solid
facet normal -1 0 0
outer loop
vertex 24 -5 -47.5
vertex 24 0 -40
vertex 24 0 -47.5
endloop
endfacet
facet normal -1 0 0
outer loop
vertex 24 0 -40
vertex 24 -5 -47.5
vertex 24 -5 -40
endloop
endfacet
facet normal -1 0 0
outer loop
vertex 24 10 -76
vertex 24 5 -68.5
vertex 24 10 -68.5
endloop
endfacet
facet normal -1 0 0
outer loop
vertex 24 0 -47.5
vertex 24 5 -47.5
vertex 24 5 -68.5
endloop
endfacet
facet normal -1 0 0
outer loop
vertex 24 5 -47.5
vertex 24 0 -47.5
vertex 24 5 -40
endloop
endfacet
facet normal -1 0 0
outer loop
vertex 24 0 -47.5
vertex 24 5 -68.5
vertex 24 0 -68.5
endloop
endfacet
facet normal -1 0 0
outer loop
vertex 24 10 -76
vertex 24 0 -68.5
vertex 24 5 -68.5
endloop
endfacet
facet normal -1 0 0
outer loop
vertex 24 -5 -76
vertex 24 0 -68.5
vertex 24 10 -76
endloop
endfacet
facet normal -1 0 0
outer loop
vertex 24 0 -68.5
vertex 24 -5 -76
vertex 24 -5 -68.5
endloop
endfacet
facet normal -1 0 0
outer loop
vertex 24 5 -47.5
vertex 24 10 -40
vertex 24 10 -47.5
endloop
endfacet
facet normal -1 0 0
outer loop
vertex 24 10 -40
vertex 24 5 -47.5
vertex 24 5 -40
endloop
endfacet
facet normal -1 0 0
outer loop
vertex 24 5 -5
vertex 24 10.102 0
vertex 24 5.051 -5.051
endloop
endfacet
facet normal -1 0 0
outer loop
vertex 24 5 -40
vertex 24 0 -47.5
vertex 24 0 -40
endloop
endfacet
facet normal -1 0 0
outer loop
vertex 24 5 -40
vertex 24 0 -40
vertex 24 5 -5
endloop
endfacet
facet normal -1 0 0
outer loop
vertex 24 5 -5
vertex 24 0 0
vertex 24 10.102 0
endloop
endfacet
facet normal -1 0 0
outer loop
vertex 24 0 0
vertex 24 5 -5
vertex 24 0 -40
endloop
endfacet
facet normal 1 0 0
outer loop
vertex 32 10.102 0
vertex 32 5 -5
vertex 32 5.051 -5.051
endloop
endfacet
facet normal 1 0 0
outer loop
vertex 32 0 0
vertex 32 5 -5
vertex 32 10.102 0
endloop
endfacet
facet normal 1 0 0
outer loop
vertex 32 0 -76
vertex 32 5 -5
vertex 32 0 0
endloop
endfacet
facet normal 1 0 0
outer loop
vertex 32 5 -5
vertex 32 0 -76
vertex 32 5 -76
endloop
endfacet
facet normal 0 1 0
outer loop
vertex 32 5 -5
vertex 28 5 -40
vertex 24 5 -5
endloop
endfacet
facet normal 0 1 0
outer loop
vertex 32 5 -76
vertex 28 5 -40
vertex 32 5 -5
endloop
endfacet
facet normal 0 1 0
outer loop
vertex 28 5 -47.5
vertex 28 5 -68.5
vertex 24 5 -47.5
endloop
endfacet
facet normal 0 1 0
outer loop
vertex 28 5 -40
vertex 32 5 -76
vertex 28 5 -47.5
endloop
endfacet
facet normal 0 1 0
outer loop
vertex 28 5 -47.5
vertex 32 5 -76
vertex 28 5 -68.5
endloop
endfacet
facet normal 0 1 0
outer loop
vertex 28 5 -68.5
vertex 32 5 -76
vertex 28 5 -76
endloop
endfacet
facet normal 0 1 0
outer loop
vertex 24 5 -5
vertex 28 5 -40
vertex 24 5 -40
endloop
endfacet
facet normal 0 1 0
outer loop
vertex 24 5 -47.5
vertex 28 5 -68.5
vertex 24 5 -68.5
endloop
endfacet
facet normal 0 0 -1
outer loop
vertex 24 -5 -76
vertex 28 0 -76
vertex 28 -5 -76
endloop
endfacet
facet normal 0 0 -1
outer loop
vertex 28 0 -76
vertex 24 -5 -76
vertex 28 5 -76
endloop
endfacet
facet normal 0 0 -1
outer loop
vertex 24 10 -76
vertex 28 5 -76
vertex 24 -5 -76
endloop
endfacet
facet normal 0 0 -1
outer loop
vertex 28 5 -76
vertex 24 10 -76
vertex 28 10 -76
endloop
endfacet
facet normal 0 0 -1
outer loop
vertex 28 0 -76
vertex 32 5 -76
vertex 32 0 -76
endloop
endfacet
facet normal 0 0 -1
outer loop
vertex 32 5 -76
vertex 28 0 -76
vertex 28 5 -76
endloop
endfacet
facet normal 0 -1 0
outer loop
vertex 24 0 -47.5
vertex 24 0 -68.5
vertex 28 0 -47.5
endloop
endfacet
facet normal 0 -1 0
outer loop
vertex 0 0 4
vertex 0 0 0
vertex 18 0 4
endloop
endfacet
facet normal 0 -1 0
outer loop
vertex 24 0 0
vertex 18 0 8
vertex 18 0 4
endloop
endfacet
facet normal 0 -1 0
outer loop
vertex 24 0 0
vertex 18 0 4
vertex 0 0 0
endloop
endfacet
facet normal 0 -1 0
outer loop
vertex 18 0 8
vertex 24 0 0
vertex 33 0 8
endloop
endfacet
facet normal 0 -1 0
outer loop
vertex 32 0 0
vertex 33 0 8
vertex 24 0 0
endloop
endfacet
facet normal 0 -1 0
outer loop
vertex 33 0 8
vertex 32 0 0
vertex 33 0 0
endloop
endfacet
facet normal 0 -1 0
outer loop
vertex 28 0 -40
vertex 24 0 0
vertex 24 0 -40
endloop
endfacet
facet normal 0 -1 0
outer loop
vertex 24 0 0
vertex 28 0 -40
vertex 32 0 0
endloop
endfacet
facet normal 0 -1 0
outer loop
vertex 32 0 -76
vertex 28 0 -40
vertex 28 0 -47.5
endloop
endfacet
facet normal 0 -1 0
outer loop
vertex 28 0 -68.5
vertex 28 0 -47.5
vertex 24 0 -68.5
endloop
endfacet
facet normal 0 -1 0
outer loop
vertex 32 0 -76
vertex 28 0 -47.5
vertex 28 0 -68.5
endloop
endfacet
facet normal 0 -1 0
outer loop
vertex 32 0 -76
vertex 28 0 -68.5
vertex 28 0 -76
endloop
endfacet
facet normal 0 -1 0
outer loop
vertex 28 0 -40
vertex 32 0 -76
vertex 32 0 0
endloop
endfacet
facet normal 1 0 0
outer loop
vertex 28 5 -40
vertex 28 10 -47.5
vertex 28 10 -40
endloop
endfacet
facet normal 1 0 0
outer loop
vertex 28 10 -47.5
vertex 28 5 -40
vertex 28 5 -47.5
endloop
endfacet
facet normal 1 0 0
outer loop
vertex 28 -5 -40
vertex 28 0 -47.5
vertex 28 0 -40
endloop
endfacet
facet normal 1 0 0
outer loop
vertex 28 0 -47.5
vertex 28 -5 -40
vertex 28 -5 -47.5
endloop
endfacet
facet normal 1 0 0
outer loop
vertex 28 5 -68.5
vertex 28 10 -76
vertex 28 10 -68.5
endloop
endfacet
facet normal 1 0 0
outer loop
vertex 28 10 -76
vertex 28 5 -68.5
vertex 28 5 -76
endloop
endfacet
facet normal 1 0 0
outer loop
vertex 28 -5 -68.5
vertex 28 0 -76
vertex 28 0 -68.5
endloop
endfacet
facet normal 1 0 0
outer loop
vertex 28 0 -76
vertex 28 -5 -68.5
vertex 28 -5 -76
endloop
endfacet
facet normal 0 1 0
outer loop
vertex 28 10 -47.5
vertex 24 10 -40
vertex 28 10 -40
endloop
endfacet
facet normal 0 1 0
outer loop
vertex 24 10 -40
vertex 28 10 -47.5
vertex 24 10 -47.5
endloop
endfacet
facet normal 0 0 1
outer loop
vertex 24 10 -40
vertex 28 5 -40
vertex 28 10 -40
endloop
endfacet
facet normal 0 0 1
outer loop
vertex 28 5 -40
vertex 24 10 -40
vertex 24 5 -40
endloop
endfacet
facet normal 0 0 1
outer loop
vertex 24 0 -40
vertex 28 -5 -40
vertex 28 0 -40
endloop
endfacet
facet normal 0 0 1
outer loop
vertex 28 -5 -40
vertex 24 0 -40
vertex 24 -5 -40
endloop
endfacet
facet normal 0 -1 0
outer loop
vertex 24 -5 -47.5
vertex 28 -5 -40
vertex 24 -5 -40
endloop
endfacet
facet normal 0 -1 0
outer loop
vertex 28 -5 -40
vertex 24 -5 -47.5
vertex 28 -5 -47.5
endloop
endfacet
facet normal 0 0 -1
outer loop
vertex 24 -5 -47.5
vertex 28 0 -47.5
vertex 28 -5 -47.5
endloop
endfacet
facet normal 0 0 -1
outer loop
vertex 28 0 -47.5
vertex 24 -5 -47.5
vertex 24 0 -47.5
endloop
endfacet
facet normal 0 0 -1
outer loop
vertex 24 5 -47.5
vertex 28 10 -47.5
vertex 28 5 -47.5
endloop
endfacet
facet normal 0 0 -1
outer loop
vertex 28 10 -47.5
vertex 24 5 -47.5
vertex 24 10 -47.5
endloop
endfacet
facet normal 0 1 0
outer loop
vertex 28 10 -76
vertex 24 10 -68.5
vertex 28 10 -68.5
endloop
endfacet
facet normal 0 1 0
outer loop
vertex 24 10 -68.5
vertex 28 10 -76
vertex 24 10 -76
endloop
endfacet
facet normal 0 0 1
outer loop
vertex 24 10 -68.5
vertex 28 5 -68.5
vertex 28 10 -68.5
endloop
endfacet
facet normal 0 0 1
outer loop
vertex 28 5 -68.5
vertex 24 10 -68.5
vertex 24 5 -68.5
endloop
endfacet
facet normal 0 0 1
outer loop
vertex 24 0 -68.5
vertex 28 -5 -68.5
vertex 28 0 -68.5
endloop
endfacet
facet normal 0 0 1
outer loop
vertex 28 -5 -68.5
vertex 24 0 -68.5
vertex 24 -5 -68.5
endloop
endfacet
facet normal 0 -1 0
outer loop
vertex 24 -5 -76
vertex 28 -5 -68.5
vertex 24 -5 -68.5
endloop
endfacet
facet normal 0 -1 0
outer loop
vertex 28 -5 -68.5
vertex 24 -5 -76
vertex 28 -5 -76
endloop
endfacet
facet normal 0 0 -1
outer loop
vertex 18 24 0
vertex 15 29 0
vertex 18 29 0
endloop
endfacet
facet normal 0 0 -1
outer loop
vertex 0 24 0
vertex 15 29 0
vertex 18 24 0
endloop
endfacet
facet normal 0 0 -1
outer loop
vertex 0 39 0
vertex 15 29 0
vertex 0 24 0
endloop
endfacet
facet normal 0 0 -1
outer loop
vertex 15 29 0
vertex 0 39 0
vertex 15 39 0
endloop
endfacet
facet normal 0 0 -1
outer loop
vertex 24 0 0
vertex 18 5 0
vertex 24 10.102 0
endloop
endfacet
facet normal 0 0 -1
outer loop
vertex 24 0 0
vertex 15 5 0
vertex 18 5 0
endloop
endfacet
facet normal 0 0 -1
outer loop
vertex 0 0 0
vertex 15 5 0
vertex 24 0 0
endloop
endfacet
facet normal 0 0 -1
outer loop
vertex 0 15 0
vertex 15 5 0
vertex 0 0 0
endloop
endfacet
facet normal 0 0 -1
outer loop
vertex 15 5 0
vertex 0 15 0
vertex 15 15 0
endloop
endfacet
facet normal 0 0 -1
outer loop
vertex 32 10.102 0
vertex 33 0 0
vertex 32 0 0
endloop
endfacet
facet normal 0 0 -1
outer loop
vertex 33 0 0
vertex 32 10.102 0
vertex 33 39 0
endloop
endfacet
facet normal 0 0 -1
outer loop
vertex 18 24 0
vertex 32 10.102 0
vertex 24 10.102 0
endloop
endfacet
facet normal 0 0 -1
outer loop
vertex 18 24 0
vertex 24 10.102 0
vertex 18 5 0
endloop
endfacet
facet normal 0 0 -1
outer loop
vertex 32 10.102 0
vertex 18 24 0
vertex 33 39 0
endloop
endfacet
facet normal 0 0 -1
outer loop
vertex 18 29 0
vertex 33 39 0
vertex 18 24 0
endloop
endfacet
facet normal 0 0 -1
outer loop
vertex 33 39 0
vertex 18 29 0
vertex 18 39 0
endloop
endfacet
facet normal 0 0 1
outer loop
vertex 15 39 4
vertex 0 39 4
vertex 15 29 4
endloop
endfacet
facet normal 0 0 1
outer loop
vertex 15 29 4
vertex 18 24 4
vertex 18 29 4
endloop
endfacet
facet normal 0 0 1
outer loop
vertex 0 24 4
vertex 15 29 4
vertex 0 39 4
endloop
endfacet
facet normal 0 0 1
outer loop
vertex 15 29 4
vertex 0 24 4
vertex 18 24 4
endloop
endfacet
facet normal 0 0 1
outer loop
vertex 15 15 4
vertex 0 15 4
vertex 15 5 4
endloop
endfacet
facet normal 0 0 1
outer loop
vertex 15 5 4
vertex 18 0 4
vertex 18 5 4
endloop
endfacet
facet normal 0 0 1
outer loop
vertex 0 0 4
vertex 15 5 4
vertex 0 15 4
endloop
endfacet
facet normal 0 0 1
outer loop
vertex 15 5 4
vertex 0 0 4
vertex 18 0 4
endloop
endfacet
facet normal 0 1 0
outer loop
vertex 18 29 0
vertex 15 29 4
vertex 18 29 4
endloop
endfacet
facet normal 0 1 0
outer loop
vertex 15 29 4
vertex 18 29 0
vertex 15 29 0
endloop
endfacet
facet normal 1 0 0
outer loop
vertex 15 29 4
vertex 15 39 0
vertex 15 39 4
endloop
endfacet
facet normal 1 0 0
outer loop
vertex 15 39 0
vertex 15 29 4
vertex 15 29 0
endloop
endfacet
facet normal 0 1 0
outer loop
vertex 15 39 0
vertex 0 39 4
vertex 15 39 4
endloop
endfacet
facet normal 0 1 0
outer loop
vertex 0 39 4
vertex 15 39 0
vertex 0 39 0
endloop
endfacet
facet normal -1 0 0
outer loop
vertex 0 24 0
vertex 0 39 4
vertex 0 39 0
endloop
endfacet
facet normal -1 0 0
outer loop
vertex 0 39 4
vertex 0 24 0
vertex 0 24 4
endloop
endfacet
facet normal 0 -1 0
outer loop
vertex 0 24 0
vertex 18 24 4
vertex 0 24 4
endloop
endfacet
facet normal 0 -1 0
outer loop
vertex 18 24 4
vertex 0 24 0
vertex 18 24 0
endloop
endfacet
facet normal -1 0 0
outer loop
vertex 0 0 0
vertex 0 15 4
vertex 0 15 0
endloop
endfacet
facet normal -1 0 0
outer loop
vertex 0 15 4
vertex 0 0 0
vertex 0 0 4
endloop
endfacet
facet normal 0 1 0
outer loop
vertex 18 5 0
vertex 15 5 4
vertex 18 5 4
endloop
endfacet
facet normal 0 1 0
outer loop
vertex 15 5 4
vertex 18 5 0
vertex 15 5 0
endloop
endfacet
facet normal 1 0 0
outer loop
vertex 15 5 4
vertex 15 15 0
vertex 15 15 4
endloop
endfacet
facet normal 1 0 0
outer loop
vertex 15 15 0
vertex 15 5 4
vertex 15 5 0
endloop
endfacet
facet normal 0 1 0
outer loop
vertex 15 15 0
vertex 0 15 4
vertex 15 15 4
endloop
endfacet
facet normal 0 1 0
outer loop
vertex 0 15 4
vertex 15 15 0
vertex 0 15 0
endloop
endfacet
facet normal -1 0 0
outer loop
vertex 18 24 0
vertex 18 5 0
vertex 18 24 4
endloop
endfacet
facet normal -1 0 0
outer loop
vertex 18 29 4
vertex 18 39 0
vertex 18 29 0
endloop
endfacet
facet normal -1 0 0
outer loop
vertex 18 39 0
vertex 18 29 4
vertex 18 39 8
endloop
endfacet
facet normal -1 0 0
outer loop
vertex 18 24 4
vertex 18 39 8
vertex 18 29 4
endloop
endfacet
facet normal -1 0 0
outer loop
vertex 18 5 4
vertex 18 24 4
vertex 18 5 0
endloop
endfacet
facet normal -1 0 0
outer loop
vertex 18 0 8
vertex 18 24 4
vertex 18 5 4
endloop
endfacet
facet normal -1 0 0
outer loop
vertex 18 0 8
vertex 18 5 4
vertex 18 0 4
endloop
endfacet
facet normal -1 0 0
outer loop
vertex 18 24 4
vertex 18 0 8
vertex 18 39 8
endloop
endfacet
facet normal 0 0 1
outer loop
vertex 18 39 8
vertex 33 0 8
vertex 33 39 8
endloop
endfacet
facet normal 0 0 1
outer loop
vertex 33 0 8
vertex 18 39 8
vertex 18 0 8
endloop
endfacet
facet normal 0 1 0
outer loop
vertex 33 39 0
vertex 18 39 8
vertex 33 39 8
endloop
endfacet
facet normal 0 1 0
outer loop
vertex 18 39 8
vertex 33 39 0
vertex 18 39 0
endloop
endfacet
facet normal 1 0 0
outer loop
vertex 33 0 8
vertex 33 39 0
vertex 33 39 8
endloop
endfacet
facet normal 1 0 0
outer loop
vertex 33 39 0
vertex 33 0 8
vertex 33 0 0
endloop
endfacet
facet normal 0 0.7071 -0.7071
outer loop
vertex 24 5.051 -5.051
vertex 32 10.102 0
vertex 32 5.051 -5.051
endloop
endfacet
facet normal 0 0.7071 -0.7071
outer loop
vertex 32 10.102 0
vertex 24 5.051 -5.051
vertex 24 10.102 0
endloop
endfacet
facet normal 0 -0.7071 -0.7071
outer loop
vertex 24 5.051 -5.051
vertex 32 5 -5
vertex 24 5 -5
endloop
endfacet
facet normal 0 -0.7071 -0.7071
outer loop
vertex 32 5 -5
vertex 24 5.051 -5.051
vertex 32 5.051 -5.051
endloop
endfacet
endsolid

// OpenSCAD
extension_length = 100;
extension_width = 5;
tooth_width = 15;
bracket_thickness = 4;
tooth_gap = 9;
pversion = "0.1a 4mm";
$fn=42;

union(){
//actual braket template
linear_extrude(bracket_thickness){
    
    square([tooth_width, 
            tooth_width]);
    translate([tooth_width, 0, 0])
        square([tooth_gap,extension_width]);
    translate([0, tooth_gap+tooth_width,0])
            square([tooth_width, tooth_width]);
    translate([0, tooth_gap+tooth_width,0])
            square([tooth_width*2, extension_width]);};

linear_extrude(bracket_thickness*2) {
    translate([tooth_gap*2, 0, 0])
            square([tooth_width, 
                    tooth_width*2+tooth_gap]);
};    


translate([tooth_width+tooth_gap,0,0]) rotate([0,90,0])
linear_extrude(bracket_thickness*2){
            rotate(45) 
            square([tooth_width/2.1, tooth_width/2.1]);};    

translate([tooth_width+tooth_gap, 0, 0]) rotate([0,90,0])
union(){
	linear_extrude(bracket_thickness*2) {
		square([extension_length-tooth_gap-tooth_width, 
			extension_width]);
	};
			
	// add little nubs to make it usefulish
	linear_extrude(bracket_thickness){
	    translate([2*extension_length/5,
		       -(tooth_width-extension_width)/2,0])
		square([tooth_width/2, tooth_width]);
	    translate([extension_length-tooth_width-tooth_gap-tooth_width/2,
		       -(tooth_width-extension_width)/2,0])
		square([tooth_width/2, tooth_width]);};
}        
        }
